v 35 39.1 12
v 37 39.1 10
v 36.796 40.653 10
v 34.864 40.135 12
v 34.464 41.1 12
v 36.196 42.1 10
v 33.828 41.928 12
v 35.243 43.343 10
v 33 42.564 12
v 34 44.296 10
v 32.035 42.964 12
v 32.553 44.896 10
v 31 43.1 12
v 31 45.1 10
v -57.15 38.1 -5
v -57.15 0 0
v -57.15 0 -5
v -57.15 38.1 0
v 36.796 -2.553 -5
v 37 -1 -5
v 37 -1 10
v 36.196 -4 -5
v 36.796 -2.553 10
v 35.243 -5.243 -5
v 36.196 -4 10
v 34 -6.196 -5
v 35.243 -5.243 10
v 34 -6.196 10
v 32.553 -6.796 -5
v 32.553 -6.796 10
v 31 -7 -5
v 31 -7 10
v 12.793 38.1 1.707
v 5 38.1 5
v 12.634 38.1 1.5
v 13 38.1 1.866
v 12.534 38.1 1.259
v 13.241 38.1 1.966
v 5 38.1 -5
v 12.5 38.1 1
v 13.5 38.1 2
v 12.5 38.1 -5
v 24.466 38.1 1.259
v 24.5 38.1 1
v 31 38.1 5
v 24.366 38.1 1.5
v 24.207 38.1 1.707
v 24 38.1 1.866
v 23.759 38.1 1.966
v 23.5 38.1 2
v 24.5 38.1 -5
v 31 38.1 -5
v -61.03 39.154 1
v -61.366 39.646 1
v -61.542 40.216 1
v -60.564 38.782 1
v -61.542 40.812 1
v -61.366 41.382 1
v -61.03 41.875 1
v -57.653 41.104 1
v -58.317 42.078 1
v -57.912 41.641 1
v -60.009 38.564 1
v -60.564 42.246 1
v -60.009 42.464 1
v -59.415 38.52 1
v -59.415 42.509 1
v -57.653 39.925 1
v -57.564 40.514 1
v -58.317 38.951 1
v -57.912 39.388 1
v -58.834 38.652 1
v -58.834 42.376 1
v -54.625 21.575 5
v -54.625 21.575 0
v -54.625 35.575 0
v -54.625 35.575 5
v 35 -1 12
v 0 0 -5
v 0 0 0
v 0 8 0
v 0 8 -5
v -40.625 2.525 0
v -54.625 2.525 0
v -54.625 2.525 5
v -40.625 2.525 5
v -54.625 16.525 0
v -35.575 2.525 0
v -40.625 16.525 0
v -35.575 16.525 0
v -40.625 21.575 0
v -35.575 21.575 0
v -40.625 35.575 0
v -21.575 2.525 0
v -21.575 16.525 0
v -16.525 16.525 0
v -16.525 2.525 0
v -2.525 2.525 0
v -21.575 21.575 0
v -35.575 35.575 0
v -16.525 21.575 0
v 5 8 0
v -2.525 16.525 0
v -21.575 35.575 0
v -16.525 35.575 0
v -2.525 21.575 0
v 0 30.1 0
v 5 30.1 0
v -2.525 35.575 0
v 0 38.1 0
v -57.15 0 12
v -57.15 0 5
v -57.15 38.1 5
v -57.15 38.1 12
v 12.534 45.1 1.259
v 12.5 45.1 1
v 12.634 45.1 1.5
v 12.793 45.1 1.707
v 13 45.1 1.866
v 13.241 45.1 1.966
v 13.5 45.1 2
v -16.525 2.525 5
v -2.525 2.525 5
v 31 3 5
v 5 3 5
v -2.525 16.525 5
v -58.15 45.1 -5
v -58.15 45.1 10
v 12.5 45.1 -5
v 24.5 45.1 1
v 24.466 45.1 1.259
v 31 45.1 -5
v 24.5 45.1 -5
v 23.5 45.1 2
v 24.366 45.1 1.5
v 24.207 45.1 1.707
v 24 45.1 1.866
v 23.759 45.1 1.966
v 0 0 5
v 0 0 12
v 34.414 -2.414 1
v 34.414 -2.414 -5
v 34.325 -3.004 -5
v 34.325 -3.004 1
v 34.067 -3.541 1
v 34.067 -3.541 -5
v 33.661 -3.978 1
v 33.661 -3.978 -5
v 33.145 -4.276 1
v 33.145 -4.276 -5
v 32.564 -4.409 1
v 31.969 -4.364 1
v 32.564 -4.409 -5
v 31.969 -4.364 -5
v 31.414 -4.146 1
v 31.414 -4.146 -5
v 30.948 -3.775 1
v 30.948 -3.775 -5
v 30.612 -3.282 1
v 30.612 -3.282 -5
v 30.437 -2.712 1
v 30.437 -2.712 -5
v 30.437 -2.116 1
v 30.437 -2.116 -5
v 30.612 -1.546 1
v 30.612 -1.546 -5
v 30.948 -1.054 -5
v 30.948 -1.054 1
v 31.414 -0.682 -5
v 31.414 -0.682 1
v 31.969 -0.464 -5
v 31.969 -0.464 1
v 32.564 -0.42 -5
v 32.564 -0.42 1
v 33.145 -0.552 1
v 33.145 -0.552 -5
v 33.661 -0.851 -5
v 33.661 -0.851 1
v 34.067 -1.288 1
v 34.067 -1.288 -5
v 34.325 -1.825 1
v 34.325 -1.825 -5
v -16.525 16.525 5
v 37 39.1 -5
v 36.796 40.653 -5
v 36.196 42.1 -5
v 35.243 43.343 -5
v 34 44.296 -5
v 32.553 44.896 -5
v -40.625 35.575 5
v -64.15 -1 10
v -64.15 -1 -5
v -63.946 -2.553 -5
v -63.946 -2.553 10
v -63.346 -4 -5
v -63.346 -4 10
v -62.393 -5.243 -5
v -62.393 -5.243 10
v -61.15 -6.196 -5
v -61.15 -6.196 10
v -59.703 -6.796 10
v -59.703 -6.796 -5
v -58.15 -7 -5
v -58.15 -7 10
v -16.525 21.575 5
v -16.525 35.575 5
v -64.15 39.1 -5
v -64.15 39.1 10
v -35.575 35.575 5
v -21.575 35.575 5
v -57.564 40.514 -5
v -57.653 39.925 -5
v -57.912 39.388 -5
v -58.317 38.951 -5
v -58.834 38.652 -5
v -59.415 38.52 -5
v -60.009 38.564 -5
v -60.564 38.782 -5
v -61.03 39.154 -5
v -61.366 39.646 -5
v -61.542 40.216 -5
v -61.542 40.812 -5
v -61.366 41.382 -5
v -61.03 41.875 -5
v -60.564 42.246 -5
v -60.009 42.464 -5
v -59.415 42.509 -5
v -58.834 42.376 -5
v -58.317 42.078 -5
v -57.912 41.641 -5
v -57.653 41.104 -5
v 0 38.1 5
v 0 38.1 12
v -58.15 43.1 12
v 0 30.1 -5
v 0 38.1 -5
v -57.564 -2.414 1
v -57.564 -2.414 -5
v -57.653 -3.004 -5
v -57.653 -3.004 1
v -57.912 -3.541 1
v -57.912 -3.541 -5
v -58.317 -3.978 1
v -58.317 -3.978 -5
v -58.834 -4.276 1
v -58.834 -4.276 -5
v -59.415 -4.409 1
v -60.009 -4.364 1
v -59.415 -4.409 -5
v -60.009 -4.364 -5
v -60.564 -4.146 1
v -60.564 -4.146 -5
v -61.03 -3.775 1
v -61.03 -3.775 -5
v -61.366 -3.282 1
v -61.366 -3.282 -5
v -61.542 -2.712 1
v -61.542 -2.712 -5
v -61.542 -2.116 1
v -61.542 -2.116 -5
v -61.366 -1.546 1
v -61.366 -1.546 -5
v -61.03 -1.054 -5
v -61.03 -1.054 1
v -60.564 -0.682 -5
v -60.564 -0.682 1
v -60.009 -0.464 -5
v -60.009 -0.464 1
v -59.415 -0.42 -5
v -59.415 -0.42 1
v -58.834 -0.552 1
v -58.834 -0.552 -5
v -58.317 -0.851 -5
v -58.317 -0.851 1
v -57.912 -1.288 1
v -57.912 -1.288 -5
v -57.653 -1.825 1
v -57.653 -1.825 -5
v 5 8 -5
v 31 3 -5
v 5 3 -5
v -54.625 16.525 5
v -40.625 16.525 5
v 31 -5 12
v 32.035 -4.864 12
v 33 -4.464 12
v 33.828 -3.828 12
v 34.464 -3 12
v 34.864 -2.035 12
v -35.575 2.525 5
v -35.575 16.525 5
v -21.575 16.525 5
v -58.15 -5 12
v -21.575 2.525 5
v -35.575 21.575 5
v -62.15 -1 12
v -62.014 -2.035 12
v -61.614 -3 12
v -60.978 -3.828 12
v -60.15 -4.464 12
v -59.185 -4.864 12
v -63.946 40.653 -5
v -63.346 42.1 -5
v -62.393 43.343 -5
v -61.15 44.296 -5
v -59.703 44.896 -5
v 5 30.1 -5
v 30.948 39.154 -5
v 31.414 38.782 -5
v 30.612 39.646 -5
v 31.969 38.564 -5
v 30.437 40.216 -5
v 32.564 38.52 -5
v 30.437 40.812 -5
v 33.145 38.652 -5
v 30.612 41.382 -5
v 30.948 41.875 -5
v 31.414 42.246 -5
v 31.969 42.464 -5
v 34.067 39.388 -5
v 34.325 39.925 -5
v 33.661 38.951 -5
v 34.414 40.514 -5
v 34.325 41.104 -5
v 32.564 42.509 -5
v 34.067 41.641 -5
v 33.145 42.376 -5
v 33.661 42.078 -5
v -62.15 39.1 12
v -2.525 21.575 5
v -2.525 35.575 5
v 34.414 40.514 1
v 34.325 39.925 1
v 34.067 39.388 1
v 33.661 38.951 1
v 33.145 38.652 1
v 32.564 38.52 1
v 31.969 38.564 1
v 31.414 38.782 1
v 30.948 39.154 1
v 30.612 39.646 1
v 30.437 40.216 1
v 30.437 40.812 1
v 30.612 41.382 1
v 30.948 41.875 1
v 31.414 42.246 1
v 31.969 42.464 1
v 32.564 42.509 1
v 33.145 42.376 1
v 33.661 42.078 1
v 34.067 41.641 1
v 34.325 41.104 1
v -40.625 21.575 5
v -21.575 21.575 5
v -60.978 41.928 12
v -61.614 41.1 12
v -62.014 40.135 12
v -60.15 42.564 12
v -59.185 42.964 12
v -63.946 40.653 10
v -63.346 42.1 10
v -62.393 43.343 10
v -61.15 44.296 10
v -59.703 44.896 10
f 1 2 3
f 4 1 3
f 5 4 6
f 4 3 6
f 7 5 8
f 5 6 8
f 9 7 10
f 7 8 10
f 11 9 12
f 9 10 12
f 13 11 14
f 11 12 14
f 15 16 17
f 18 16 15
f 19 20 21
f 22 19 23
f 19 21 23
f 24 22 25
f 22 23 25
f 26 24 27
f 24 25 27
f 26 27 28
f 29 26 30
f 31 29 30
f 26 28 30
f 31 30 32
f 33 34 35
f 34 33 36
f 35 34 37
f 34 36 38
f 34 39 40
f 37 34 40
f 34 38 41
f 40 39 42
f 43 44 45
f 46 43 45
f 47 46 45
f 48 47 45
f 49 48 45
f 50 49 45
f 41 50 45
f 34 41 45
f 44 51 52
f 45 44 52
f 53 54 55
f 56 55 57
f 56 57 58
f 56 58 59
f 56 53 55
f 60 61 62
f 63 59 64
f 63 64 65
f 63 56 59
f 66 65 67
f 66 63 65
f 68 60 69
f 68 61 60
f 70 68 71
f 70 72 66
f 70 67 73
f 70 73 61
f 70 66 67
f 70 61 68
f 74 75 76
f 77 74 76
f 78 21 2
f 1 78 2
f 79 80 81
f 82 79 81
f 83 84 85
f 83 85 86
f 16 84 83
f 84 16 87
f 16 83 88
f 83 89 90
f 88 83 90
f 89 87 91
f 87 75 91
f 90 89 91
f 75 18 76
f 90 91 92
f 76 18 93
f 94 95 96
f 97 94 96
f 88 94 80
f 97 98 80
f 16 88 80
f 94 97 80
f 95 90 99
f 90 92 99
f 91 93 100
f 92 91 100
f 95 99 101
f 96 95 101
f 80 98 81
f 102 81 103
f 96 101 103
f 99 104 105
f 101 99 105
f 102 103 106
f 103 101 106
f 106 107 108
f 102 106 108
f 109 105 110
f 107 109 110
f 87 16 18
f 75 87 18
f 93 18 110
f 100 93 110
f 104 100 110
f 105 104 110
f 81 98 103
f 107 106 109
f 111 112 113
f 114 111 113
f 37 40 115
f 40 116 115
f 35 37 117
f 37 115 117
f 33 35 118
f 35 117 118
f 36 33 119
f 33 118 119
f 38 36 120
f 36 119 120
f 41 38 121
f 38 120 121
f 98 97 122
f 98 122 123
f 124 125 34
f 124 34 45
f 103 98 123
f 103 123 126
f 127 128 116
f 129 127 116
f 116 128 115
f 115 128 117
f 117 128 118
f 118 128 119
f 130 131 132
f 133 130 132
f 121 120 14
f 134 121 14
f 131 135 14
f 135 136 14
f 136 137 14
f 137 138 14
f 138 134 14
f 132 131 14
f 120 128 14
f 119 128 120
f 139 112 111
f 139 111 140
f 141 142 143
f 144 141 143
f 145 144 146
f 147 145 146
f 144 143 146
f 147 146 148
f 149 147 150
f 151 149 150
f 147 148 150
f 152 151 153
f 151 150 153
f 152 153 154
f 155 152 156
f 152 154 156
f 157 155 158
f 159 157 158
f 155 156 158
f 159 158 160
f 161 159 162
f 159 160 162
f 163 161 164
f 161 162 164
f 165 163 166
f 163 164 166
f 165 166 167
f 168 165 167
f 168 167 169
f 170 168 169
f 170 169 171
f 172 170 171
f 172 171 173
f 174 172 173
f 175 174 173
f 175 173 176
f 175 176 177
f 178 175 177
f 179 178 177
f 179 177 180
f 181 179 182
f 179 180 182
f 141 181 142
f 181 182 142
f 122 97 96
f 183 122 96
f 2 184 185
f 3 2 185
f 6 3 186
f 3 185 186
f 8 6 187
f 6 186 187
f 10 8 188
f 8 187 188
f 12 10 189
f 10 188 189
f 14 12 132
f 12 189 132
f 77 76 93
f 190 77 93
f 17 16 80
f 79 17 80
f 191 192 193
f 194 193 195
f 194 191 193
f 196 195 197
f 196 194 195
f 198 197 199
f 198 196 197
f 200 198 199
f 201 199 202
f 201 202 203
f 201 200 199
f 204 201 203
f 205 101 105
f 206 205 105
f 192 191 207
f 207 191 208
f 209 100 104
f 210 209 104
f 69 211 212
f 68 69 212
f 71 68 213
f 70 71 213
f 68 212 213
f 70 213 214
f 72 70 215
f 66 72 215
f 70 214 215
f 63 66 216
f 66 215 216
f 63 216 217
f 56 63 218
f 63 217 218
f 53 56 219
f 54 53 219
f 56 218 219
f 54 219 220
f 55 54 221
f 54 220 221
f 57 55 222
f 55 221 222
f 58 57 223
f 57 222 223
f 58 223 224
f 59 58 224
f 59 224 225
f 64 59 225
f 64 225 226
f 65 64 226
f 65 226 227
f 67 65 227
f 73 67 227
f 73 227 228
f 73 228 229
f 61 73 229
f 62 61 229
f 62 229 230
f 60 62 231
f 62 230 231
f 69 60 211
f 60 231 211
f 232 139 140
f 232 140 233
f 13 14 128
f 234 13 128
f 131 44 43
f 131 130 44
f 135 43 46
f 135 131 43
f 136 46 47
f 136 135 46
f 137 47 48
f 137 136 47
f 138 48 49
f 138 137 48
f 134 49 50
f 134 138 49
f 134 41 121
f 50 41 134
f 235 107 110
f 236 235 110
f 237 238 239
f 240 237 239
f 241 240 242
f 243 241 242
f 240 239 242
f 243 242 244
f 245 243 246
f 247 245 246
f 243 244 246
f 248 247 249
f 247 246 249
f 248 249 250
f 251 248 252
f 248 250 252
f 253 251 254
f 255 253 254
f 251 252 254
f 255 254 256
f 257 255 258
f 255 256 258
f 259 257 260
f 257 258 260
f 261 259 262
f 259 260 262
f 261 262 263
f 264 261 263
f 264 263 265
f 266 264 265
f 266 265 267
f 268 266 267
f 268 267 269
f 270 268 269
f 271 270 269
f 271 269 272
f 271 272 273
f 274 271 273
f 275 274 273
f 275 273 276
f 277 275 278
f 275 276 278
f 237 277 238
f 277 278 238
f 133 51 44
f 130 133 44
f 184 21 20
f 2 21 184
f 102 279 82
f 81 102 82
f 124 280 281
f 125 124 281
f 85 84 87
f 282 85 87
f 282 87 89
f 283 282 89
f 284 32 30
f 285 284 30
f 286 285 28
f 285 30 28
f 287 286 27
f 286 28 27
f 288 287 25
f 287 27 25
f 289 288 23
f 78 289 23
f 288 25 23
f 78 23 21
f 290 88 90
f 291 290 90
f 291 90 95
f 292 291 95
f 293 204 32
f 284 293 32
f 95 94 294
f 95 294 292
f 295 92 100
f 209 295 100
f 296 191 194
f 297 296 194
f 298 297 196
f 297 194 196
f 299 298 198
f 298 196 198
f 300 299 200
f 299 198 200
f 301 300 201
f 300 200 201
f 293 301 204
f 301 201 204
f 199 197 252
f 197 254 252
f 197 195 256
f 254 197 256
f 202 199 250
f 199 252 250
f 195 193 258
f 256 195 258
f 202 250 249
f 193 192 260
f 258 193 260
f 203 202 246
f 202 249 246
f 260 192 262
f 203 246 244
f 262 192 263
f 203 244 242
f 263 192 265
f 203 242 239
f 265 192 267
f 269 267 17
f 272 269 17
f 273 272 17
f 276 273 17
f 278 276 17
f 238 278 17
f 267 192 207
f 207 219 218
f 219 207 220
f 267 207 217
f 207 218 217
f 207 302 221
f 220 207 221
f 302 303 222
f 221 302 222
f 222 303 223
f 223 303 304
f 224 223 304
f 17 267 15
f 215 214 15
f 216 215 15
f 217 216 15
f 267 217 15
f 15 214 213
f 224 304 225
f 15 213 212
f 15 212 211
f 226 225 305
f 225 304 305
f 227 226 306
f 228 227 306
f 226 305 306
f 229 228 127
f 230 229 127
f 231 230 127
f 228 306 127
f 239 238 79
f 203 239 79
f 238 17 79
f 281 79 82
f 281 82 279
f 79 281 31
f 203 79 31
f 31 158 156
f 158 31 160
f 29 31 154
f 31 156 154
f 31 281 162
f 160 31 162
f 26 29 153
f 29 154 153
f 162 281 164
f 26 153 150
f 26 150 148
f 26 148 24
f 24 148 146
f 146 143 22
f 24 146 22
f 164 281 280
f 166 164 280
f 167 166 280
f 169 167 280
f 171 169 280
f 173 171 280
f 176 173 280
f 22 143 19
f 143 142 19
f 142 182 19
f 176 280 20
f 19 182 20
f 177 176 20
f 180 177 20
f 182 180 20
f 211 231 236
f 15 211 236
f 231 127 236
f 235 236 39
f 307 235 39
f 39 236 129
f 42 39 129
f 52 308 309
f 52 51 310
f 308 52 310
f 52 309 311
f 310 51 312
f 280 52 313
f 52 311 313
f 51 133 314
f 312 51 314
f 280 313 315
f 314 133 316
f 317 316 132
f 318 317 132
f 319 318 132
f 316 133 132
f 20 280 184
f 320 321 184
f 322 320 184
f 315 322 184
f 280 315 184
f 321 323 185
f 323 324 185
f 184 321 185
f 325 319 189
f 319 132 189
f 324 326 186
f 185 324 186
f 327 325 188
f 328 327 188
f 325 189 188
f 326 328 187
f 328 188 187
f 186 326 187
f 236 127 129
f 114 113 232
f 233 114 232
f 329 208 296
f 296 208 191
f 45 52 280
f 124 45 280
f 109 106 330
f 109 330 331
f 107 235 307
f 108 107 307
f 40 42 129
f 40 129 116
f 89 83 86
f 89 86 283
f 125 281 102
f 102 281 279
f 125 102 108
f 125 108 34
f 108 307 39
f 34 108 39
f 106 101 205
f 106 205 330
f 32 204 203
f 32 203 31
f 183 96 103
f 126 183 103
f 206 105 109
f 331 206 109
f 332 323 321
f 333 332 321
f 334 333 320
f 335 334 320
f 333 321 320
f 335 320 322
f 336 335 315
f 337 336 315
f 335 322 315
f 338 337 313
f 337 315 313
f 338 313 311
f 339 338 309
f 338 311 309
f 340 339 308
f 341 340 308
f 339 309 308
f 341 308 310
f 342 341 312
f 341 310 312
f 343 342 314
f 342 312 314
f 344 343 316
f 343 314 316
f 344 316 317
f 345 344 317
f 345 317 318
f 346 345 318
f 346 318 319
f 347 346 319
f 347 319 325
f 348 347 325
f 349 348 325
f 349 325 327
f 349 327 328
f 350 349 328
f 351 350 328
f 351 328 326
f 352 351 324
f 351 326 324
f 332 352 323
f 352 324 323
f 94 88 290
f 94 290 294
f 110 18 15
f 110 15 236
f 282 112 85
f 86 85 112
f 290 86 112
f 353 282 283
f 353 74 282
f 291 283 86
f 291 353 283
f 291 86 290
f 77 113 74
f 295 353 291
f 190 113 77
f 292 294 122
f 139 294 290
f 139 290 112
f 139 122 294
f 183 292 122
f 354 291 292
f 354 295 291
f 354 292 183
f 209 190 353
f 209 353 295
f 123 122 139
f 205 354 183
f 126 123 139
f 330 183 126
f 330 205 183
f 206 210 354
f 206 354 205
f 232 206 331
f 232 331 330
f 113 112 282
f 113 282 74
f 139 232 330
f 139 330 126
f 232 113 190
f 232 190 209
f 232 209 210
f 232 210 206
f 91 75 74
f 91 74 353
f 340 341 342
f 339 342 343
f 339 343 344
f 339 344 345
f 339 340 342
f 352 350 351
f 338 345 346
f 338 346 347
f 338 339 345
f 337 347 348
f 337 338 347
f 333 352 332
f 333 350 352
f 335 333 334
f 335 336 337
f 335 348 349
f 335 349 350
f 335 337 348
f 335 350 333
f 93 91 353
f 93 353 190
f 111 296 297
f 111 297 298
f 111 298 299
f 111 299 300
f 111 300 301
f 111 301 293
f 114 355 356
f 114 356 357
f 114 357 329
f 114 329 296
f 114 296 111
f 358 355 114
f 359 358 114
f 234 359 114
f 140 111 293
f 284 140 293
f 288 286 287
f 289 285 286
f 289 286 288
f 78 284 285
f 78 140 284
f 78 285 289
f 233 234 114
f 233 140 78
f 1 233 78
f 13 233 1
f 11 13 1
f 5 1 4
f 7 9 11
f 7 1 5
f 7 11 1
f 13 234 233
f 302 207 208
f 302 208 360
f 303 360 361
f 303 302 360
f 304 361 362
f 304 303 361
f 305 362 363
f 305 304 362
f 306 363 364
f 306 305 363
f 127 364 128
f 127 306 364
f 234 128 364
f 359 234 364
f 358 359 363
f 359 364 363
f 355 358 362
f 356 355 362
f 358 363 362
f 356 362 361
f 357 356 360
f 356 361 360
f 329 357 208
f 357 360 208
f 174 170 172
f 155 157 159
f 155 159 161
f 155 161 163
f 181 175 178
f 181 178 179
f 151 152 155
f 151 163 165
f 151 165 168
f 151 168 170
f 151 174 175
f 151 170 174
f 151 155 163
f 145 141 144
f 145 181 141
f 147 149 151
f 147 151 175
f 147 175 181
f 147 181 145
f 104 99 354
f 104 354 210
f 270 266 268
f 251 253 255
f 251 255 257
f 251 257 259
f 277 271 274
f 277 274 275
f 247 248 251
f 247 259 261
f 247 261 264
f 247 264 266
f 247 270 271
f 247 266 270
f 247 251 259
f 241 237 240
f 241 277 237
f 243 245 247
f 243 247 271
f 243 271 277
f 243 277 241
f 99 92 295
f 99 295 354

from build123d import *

# Parameters (mm, degrees)
SKETCH011_W       = 57.15
SKETCH011_H       = 38.1
SKETCH011_W_2     = 14
SKETCH011_H_2     = 14
PAD007_DEPTH      = 5
SKETCH012_W       = 101.15
SKETCH012_H       = 52.1
SKETCH012_W_2     = 57.15
SKETCH012_H_2     = 38.1
PAD008_DEPTH      = 12
PAD008_DEPTH_BACK = 5
FILLET001_R       = 6
POCKET005_DEPTH   = 5
SKETCH014_W       = 26
SKETCH014_H       = 35.1
POCKET006_DEPTH   = 5
SKETCH015_W       = 12
SKETCH015_H       = 7
POCKET007_DEPTH   = 7.001
FILLET002_R       = 1
CHAMFER001_SIZE   = 2
SKETCH018_R       = 2
POCKET008_DEPTH   = 6


with BuildPart() as part:
    # Sketch011 → Pad007 (new body)
    with BuildSketch(Plane.XY):
        with Locations((-28.575, 19.05)):
            Rectangle(SKETCH011_W, SKETCH011_H)
        with Locations((-47.625, 28.575)):
            Rectangle(SKETCH011_W_2, SKETCH011_H_2, mode=Mode.SUBTRACT)
        with Locations((-28.575, 28.575)):
            Rectangle(SKETCH011_W_2, SKETCH011_H_2, mode=Mode.SUBTRACT)
        with Locations((-9.525, 28.575)):
            Rectangle(SKETCH011_W_2, SKETCH011_H_2, mode=Mode.SUBTRACT)
        with Locations((-47.625, 9.525)):
            Rectangle(SKETCH011_W_2, SKETCH011_H_2, mode=Mode.SUBTRACT)
        with Locations((-28.575, 9.525)):
            Rectangle(SKETCH011_W_2, SKETCH011_H_2, mode=Mode.SUBTRACT)
        with Locations((-9.525, 9.525)):
            Rectangle(SKETCH011_W_2, SKETCH011_H_2, mode=Mode.SUBTRACT)
    extrude(amount=PAD007_DEPTH)

    # Sketch012 → Pad008 (join, two sides)
    with BuildSketch(Plane.XY) as pad008_sk:
        with Locations((-13.575, 19.05)):
            Rectangle(SKETCH012_W, SKETCH012_H)
        with Locations((-28.575, 19.05)):
            Rectangle(SKETCH012_W_2, SKETCH012_H_2, mode=Mode.SUBTRACT)
    extrude(amount=PAD008_DEPTH)
    extrude(pad008_sk.sketch, amount=-PAD008_DEPTH_BACK)

    # Fillet001
    fillet001_edges = [part.edges().sort_by_distance(p)[0] for p in [
        (37, -7, 3.5),
        (37, 45.1, 3.5),
        (-64.15, -7, 3.5),
        (-64.15, 45.1, 3.5),
    ]]
    fillet(fillet001_edges, radius=FILLET001_R)

    # Sketch013 (on Face2 of Fillet001) → Pocket005 (cut)
    with BuildSketch(Plane(origin=(0, 0, -5), x_dir=(1, 0, 0), z_dir=(0, 0, -1))):
        Polygon((5, -8), (-2.525, -8), (-2.525, -30.1), (5, -30.1), (5, -38.1), (31, -38.1), (31, -3), (5, -3), align=None)
    extrude(amount=-POCKET005_DEPTH, mode=Mode.SUBTRACT)

    # Sketch014 (on Face28 of Pocket005) → Pocket006 (cut)
    with BuildSketch(Plane(origin=(0, 0, 0), x_dir=(1, 0, 0), z_dir=(0, 0, -1))):
        with Locations((18, -20.55)):
            Rectangle(SKETCH014_W, SKETCH014_H)
    extrude(amount=-POCKET006_DEPTH, mode=Mode.SUBTRACT)

    # Sketch015 (on Face16 of Pocket006) → Pocket007 (cut, through all)
    with BuildSketch(Plane.XZ.offset(-38.1)):
        with Locations((18.5, -1.5)):
            Rectangle(SKETCH015_W, SKETCH015_H)
    extrude(amount=-POCKET007_DEPTH, mode=Mode.SUBTRACT)

    # Fillet002
    fillet002_edges = [part.edges().sort_by_distance(p)[0] for p in [
        (24.5, 41.6, 2),
        (12.5, 41.6, 2),
    ]]
    fillet(fillet002_edges, radius=FILLET002_R)

    # Chamfer001
    chamfer001_edges = [part.edges().sort_by_distance(p)[0] for p in [
        (-13.575, -7, 12),
    ]]
    chamfer(chamfer001_edges, length=CHAMFER001_SIZE)

    # Sketch018 (on Face4 of Chamfer001) → Pocket008 (cut)
    with BuildSketch(Plane(origin=(0, 0, -5), x_dir=(1, 0, 0), z_dir=(0, 0, -1))):
        with Locations((-59.564214, 2.414214)):
            Circle(SKETCH018_R)
        with Locations((32.414214, 2.414214)):
            Circle(SKETCH018_R)
        with Locations((32.414214, -40.514214)):
            Circle(SKETCH018_R)
        with Locations((-59.564214, -40.514214)):
            Circle(SKETCH018_R)
    extrude(amount=-POCKET008_DEPTH, mode=Mode.SUBTRACT)


solid = part.part
